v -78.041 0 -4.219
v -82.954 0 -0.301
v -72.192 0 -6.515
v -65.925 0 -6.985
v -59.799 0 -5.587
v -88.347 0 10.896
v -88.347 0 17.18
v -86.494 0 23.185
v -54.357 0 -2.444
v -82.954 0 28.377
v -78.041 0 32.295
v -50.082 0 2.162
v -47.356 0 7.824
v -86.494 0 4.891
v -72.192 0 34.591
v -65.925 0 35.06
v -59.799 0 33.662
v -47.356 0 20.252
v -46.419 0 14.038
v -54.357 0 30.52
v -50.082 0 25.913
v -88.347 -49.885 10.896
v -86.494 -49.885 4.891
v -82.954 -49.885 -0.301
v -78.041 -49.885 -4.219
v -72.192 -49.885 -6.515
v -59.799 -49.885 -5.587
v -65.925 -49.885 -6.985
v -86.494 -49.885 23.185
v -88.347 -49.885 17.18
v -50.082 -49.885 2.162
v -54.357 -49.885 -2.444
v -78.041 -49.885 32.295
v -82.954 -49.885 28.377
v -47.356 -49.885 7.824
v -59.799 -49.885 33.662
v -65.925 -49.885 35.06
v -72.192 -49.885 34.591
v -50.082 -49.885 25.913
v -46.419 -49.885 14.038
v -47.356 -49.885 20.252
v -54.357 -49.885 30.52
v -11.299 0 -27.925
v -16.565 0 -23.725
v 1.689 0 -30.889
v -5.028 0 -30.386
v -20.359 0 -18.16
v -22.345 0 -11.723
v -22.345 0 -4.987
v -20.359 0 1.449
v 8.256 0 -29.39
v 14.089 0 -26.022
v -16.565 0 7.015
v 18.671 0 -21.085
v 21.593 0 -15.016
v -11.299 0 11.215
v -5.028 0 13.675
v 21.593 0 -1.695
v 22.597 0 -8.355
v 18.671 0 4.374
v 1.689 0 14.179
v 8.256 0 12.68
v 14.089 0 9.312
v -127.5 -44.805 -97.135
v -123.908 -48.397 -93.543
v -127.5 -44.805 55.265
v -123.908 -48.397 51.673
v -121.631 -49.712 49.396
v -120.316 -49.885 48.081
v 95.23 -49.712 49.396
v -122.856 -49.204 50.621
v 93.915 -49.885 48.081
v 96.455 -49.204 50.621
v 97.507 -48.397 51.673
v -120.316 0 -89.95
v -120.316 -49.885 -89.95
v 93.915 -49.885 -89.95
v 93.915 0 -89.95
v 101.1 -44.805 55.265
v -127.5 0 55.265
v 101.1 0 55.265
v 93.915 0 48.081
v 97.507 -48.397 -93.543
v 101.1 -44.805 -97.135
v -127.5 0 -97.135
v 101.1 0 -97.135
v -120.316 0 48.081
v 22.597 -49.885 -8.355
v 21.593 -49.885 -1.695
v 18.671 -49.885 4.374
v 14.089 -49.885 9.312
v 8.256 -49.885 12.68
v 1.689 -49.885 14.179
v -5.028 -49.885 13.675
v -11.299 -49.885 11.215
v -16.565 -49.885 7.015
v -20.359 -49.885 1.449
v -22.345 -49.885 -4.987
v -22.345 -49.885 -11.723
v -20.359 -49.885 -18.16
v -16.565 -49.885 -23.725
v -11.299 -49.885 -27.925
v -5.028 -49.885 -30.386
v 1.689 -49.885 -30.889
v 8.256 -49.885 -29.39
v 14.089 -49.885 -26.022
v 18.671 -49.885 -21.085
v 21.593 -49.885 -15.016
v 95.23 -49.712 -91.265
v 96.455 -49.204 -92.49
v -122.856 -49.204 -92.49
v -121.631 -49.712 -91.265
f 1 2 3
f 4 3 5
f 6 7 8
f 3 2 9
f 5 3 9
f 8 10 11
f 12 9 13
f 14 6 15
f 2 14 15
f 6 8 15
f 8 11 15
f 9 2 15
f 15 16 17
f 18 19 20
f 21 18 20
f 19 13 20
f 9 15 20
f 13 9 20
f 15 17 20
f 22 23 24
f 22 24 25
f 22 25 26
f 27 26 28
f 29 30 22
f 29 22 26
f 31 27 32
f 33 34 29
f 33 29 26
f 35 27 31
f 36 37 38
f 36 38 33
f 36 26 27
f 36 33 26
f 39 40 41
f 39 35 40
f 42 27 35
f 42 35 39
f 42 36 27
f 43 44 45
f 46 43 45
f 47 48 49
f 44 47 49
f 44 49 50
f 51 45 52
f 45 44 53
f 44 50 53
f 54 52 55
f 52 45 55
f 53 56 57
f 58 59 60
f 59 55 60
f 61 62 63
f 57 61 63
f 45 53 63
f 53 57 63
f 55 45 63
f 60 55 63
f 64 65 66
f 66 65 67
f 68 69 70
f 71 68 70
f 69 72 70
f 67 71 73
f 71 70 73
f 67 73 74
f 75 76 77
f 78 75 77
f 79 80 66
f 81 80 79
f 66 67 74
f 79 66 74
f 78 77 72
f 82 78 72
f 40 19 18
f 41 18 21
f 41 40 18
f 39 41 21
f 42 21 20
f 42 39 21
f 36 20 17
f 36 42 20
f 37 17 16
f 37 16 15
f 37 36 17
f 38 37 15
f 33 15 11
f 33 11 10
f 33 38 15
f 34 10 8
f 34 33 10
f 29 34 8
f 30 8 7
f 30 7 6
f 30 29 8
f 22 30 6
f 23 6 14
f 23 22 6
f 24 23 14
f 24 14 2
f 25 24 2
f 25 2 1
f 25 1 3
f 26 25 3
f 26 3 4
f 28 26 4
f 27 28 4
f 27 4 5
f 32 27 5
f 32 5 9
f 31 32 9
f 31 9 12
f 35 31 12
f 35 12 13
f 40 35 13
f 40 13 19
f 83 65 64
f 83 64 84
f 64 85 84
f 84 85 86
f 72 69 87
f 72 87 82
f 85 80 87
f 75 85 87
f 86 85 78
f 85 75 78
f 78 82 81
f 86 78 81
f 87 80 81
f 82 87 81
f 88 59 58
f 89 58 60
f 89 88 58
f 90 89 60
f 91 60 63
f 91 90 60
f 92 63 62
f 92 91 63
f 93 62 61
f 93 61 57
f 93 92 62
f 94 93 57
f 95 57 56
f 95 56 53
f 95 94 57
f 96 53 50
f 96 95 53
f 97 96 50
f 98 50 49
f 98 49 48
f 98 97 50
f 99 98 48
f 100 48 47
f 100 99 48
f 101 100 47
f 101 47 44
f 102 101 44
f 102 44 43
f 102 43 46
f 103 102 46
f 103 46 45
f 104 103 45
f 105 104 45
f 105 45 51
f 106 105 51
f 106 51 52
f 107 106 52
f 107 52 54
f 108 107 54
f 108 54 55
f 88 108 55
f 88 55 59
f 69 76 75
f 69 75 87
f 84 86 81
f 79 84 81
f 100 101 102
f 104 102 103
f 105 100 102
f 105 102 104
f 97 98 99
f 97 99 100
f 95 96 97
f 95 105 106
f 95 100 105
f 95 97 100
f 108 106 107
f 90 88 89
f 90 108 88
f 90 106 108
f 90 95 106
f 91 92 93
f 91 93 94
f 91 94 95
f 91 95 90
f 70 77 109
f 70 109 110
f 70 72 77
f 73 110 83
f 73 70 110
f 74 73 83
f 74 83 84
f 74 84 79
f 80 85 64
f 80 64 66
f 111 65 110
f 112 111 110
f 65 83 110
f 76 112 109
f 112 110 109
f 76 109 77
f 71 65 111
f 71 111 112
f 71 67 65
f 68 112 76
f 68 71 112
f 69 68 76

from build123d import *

# Parameters (mm, degrees)
F0_W     = 228.6
F0_H     = 152.4
F1_DEPTH = 49.88488
F2_SIZE  = 5.08
F3_R     = 5.08
F5_W     = 214.2315902063
F5_H     = 138.0315902063
F5_R     = 21.0814502393
F5_R_2   = 22.5972047165
F6_DEPTH = 221.82462


with BuildPart() as f1:
    # F0 (on Front) → F1 (new body)
    with BuildSketch(Plane.XZ):
        with Locations((-13.2004208863, -20.9346948183)):
            Rectangle(F0_W, F0_H)
    extrude(amount=F1_DEPTH)

    # F2
    f2_edges = [f1.edges().sort_by_distance(p)[0] for p in [
        (-13.200421, -49.88488, 55.265305),
        (101.099579, -49.88488, -20.934695),
        (-13.200421, -49.88488, -97.134695),
        (-127.500421, -49.88488, -20.934695),
    ]]
    chamfer(f2_edges, length=F2_SIZE)

    # F3
    f3_edges = [f1.edges().sort_by_distance(p)[0] for p in [
        (-13.200421, -49.88488, 50.185305),
        (-122.420421, -49.88488, -20.934695),
        (96.019579, -49.88488, -20.934695),
        (-13.200421, -49.88488, -92.054695),
    ]]
    fillet(f3_edges, radius=F3_R)

    # F5 (on face) → F6 (cut)
    with BuildSketch(Plane.XZ.offset(49.88488)):
        with Locations((-13.2004208863, -20.9346948183)):
            Rectangle(F5_W, F5_H)
        with Locations((-67.5006881356, 14.0376649797)):
            Circle(F5_R, mode=Mode.SUBTRACT)
        with Locations((0, -8.3551658317)):
            Circle(F5_R_2, mode=Mode.SUBTRACT)
    extrude(amount=-F6_DEPTH, mode=Mode.SUBTRACT)


solid = f1.part
